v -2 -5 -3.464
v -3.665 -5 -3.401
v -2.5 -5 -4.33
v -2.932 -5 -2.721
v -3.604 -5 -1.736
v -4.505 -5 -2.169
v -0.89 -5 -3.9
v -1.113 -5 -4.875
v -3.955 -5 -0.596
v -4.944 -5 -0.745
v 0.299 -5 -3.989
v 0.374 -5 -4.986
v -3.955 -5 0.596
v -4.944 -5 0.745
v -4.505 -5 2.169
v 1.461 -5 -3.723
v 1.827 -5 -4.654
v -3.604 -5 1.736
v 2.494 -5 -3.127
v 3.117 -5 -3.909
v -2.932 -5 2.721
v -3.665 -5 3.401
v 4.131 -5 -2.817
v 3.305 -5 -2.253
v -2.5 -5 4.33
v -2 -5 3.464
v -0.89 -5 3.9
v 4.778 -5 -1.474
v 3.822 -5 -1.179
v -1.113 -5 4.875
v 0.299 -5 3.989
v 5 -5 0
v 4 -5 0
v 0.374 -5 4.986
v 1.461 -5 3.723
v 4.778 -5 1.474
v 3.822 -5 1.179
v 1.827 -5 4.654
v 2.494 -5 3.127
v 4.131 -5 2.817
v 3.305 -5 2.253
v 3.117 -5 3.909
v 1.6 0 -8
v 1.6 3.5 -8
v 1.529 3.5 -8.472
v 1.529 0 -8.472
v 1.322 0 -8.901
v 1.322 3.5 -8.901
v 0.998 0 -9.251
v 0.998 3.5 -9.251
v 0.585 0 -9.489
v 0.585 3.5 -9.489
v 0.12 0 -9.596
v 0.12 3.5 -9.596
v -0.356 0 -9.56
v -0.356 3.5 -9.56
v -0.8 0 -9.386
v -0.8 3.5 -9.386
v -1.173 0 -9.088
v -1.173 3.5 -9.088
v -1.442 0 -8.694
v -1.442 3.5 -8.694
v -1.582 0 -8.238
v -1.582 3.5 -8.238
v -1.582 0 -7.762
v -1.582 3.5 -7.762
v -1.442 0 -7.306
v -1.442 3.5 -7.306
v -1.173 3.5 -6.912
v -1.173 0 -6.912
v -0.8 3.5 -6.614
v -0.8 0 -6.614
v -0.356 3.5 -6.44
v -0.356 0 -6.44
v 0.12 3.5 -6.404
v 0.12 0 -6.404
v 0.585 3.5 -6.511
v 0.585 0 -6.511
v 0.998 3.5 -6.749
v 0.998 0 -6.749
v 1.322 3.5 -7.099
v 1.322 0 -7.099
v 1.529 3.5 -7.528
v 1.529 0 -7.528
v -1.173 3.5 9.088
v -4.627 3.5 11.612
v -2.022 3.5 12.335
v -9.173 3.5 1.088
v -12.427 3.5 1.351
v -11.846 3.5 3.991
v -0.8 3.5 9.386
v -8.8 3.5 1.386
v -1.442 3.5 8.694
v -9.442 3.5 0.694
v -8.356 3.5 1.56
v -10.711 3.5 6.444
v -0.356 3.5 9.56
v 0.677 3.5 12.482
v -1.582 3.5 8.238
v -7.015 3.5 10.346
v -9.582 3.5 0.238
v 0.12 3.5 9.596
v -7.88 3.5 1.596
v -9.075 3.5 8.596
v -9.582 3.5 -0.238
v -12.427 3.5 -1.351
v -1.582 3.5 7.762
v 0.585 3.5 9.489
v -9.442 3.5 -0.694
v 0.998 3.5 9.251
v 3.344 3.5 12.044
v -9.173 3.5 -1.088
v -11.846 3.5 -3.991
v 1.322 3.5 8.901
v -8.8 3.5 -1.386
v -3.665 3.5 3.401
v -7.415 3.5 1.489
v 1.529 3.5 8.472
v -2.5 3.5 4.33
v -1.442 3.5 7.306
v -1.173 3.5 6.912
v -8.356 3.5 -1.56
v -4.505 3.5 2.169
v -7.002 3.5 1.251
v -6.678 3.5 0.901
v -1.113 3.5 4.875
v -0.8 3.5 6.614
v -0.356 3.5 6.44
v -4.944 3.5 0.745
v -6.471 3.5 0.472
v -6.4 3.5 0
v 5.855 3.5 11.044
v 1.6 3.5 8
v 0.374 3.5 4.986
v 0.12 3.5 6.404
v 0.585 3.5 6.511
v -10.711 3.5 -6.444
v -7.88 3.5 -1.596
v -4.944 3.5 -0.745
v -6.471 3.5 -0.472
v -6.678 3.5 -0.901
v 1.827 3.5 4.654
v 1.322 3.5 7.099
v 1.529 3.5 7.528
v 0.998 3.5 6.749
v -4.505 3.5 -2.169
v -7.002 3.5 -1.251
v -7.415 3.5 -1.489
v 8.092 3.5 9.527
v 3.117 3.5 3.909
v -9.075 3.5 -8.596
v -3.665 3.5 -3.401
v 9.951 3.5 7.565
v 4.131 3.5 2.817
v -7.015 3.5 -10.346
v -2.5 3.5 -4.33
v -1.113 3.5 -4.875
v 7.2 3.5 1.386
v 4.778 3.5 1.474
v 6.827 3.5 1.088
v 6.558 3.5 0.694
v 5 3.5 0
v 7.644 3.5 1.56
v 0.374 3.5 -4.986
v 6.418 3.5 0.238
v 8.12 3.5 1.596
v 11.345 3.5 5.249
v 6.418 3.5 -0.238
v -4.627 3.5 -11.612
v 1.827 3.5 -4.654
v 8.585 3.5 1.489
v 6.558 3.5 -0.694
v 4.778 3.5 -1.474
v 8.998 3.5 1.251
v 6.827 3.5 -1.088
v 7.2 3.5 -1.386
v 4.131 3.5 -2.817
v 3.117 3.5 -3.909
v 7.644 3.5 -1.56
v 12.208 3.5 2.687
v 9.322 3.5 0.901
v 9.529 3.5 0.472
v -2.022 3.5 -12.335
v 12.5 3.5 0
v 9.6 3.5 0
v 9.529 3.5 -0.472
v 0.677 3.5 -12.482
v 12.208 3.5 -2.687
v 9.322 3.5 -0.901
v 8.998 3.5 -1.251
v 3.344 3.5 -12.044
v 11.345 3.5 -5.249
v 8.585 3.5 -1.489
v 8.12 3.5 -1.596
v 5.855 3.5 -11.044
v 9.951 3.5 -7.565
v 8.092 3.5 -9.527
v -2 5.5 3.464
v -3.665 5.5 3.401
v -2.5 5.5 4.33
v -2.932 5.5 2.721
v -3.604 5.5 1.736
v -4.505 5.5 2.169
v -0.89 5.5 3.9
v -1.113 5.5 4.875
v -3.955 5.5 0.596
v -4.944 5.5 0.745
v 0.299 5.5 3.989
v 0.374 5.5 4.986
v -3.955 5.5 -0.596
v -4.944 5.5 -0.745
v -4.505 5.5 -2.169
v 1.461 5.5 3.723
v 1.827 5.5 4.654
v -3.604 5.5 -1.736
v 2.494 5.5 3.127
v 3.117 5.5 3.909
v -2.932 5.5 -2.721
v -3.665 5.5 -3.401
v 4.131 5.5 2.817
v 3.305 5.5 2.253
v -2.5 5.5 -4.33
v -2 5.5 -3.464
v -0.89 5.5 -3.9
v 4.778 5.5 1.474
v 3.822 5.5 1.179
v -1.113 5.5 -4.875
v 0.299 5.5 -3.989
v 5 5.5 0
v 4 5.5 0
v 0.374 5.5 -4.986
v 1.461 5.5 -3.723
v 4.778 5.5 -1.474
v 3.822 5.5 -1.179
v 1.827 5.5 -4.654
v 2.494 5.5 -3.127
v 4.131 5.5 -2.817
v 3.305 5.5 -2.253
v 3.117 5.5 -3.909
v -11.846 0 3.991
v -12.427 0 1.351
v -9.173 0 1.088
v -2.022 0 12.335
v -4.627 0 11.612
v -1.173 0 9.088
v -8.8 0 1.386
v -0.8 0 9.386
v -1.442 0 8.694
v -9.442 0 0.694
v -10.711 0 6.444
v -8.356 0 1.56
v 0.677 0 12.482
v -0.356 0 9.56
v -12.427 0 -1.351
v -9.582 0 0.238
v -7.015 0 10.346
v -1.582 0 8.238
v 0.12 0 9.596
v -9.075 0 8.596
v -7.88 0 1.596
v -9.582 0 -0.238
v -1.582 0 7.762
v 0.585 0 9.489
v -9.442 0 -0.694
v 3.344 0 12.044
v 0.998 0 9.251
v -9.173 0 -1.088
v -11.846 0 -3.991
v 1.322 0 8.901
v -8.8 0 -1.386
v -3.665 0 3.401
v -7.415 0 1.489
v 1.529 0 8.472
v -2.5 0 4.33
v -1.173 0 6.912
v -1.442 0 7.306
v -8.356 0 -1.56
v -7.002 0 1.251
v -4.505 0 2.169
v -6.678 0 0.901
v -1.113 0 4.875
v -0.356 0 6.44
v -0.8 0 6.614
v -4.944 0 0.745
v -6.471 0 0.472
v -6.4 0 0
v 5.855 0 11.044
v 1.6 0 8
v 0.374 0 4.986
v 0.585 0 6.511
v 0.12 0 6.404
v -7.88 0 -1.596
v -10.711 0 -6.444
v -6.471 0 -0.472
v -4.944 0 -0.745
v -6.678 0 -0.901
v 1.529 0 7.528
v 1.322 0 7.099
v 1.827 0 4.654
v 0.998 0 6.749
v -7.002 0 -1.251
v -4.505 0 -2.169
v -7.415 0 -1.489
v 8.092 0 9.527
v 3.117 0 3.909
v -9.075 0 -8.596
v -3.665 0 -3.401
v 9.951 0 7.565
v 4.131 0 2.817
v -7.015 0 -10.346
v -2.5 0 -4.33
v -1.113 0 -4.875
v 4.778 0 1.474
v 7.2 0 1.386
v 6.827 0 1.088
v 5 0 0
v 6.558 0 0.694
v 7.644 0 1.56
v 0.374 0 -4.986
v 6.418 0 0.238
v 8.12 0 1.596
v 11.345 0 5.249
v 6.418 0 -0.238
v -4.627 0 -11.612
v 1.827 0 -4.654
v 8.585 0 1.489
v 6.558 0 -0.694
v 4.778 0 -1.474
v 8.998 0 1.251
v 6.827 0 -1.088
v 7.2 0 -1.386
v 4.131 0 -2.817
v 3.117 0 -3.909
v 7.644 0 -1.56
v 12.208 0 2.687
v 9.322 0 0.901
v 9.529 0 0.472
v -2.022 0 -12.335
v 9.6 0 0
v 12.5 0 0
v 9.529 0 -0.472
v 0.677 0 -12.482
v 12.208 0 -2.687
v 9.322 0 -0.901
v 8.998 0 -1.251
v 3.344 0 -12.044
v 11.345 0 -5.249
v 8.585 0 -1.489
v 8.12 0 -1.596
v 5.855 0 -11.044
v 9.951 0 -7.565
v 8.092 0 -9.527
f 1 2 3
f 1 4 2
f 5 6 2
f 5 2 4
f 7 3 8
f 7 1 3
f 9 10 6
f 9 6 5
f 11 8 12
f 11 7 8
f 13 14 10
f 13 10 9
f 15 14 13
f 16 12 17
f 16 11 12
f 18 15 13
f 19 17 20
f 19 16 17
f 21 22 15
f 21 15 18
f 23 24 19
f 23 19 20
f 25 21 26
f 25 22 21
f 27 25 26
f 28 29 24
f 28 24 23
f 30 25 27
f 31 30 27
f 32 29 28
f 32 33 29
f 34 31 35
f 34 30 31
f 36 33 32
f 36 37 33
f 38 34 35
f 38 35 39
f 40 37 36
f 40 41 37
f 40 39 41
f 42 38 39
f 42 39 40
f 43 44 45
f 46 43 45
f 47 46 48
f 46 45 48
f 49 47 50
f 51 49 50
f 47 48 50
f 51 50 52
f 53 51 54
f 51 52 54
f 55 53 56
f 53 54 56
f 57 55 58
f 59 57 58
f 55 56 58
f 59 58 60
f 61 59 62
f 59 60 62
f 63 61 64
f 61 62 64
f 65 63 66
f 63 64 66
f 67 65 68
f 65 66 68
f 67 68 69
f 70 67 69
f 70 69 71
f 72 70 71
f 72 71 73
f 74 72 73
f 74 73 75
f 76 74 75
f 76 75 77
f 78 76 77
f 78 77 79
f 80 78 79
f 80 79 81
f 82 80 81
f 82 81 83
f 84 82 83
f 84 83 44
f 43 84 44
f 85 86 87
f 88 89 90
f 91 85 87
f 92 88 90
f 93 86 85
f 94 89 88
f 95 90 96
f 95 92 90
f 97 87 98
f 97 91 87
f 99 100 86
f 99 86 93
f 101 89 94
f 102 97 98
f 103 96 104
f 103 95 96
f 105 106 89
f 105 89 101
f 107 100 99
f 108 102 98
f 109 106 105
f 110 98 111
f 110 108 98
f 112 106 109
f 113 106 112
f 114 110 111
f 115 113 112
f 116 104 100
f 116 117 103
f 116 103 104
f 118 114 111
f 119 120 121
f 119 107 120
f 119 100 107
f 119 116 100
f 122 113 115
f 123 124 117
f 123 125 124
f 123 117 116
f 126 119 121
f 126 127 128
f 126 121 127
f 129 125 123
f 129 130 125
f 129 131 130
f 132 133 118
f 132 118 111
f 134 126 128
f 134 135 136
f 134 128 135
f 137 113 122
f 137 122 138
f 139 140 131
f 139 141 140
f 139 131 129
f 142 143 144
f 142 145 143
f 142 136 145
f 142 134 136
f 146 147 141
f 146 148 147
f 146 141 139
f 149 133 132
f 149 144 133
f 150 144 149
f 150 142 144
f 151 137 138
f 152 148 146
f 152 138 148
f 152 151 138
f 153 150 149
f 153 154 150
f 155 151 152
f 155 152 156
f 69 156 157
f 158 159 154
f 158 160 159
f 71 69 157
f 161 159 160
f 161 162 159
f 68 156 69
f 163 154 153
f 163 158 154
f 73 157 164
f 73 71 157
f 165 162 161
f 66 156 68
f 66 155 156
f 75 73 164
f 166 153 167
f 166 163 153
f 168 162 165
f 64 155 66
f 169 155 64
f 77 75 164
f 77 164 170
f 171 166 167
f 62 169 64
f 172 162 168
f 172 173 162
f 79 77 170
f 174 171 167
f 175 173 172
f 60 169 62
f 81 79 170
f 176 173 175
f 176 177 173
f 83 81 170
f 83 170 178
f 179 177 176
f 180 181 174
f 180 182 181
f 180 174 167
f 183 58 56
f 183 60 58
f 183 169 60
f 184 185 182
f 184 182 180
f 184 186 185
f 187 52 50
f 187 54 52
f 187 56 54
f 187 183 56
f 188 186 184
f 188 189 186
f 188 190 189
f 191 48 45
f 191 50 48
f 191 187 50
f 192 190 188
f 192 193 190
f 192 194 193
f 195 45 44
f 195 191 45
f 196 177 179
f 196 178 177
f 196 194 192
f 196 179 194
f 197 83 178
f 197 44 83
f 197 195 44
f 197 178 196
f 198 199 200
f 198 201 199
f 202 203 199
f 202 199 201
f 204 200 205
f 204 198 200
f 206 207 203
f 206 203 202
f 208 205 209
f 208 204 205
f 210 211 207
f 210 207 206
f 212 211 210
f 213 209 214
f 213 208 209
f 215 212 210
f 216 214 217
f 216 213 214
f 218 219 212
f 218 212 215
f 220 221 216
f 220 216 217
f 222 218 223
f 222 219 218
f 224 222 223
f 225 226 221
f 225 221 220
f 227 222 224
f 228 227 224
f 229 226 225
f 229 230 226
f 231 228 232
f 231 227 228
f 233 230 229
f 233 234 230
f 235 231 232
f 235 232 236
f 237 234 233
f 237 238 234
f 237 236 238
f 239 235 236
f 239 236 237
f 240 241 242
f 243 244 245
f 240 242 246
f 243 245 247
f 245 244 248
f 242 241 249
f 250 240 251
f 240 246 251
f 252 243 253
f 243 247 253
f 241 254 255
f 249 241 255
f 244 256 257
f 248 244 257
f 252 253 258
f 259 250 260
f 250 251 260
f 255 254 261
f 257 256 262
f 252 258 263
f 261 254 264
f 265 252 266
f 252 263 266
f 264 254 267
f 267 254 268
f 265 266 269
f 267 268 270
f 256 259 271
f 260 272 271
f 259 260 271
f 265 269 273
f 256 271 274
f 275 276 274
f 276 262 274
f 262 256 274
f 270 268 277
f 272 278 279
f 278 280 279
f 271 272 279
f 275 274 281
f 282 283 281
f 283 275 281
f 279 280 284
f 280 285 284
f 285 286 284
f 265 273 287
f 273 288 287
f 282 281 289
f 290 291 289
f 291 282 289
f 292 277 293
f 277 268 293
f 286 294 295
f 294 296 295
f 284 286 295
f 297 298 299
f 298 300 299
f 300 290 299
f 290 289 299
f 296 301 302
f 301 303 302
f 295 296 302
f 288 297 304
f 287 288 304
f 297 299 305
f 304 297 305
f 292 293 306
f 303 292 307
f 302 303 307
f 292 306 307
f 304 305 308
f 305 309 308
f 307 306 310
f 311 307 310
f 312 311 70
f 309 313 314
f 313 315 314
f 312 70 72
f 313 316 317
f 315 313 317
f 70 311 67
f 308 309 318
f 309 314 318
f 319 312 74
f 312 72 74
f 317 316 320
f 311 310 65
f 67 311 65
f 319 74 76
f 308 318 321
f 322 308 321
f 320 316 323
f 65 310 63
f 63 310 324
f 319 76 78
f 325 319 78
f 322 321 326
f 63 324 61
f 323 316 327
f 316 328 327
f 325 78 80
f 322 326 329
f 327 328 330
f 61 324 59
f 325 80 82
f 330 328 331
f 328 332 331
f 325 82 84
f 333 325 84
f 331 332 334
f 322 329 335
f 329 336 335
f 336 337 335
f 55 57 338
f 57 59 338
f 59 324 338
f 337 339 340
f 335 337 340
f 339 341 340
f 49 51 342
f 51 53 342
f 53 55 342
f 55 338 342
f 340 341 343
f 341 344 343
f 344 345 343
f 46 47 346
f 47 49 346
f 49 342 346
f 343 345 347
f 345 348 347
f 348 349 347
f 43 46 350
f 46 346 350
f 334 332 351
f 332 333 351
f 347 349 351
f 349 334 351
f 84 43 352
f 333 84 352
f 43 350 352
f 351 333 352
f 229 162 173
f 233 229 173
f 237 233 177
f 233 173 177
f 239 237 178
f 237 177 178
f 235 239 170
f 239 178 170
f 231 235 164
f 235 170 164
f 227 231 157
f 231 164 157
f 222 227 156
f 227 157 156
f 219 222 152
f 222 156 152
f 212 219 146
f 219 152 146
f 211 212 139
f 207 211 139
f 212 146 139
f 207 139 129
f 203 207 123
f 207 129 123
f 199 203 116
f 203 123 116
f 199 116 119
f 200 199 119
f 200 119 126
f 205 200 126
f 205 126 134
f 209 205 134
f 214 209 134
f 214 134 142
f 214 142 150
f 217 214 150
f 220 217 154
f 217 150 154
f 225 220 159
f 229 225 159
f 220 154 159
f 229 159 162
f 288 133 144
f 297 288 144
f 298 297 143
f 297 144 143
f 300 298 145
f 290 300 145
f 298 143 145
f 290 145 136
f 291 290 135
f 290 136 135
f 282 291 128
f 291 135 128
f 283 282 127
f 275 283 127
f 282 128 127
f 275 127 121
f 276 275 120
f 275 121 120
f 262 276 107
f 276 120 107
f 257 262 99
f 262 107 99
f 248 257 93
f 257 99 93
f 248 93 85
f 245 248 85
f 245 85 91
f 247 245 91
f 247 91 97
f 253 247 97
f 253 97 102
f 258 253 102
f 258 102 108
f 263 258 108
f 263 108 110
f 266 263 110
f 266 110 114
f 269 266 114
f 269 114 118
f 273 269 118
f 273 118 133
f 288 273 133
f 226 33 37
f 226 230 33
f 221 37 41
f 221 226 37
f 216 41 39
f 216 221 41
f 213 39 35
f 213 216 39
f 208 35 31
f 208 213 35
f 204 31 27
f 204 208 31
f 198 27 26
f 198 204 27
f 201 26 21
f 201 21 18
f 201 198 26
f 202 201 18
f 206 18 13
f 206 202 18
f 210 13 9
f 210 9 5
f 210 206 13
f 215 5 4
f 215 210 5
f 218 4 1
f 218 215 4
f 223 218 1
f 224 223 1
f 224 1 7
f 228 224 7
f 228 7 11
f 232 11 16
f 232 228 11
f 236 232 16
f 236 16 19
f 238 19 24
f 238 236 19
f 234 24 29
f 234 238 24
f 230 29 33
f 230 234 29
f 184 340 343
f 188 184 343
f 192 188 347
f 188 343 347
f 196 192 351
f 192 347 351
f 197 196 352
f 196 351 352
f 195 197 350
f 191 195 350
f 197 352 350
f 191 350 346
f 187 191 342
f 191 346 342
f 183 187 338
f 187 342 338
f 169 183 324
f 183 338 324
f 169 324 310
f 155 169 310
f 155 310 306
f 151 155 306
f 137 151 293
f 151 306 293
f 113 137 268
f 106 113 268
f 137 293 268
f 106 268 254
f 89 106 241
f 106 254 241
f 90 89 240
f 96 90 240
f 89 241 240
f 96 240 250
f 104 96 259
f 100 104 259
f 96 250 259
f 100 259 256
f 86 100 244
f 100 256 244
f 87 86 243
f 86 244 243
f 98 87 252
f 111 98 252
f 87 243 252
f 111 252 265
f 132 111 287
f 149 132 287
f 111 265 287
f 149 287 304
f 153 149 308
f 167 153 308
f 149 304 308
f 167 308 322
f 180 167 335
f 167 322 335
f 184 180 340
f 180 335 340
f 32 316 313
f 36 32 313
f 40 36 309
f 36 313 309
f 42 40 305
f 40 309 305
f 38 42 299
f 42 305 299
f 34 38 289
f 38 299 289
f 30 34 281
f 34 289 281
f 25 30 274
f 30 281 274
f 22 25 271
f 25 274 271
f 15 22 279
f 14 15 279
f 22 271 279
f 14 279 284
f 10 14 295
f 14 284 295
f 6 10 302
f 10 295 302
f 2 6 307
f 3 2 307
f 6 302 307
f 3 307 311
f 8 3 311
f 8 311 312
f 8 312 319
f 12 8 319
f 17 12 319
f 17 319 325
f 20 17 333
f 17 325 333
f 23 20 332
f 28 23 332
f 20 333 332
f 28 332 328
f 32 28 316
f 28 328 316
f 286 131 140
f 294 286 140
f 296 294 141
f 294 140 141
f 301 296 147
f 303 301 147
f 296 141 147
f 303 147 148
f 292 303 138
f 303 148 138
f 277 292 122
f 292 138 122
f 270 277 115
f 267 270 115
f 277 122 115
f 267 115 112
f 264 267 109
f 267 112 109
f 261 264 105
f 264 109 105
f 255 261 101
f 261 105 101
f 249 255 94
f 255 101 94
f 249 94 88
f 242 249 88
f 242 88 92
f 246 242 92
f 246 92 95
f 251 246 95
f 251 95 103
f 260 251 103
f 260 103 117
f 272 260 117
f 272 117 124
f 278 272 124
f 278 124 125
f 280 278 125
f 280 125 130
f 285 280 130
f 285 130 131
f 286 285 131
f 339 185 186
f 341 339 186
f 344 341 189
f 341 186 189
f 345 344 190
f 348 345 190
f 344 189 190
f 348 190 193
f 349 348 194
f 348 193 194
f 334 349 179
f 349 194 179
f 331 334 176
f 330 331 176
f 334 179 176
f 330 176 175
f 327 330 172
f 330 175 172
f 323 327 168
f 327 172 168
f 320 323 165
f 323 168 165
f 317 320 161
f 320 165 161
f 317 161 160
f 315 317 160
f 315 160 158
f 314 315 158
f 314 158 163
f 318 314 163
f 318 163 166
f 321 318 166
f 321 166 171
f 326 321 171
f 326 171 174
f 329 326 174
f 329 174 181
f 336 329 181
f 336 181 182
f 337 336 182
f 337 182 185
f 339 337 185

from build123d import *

# Parameters (mm, degrees)
SKETCH2_R           = 12.5
SKETCH2_R_2         = 4
BOSS_EXTRUDE1_DEPTH = 3.5
SKETCH3_R           = 5
SKETCH3_R_2         = 4
BOSS_EXTRUDE2_DEPTH = 2
SKETCH4_R           = 5
SKETCH4_R_2         = 4
BOSS_EXTRUDE3_DEPTH = 5
SKETCH5_R           = 1.6
CUT_EXTRUDE1_DEPTH  = 9.5


with BuildPart() as part:
    # Sketch2 → Boss-Extrude1 (new body)
    with BuildSketch(Plane(origin=(0, 0, 0), x_dir=(1, 0, 0), z_dir=(0, 1, 0))):
        Circle(SKETCH2_R)
        Circle(SKETCH2_R_2, mode=Mode.SUBTRACT)
    extrude(amount=BOSS_EXTRUDE1_DEPTH)

    # Sketch3 → Boss-Extrude2 (add)
    with BuildSketch(Plane(origin=(0, 3.5, 0), x_dir=(1, 0, 0), z_dir=(0, 1, 0))):
        Circle(SKETCH3_R)
        Circle(SKETCH3_R_2, mode=Mode.SUBTRACT)
    extrude(amount=BOSS_EXTRUDE2_DEPTH)

    # Sketch4 → Boss-Extrude3 (add)
    with BuildSketch(Plane.XZ):
        Circle(SKETCH4_R)
        Circle(SKETCH4_R_2, mode=Mode.SUBTRACT)
    extrude(amount=BOSS_EXTRUDE3_DEPTH)

    # Sketch5 → Cut-Extrude1 (cut, through all)
    with BuildSketch(Plane(origin=(0, 3.5, 0), x_dir=(1, 0, 0), z_dir=(0, 1, 0))):
        with Locations((0, 8)):
            Circle(SKETCH5_R)
        with Locations((8, 0)):
            Circle(SKETCH5_R)
        with Locations((0, -8)):
            Circle(SKETCH5_R)
        with Locations((-8, 0)):
            Circle(SKETCH5_R)
    extrude(amount=-CUT_EXTRUDE1_DEPTH, mode=Mode.SUBTRACT)


solid = part.part
